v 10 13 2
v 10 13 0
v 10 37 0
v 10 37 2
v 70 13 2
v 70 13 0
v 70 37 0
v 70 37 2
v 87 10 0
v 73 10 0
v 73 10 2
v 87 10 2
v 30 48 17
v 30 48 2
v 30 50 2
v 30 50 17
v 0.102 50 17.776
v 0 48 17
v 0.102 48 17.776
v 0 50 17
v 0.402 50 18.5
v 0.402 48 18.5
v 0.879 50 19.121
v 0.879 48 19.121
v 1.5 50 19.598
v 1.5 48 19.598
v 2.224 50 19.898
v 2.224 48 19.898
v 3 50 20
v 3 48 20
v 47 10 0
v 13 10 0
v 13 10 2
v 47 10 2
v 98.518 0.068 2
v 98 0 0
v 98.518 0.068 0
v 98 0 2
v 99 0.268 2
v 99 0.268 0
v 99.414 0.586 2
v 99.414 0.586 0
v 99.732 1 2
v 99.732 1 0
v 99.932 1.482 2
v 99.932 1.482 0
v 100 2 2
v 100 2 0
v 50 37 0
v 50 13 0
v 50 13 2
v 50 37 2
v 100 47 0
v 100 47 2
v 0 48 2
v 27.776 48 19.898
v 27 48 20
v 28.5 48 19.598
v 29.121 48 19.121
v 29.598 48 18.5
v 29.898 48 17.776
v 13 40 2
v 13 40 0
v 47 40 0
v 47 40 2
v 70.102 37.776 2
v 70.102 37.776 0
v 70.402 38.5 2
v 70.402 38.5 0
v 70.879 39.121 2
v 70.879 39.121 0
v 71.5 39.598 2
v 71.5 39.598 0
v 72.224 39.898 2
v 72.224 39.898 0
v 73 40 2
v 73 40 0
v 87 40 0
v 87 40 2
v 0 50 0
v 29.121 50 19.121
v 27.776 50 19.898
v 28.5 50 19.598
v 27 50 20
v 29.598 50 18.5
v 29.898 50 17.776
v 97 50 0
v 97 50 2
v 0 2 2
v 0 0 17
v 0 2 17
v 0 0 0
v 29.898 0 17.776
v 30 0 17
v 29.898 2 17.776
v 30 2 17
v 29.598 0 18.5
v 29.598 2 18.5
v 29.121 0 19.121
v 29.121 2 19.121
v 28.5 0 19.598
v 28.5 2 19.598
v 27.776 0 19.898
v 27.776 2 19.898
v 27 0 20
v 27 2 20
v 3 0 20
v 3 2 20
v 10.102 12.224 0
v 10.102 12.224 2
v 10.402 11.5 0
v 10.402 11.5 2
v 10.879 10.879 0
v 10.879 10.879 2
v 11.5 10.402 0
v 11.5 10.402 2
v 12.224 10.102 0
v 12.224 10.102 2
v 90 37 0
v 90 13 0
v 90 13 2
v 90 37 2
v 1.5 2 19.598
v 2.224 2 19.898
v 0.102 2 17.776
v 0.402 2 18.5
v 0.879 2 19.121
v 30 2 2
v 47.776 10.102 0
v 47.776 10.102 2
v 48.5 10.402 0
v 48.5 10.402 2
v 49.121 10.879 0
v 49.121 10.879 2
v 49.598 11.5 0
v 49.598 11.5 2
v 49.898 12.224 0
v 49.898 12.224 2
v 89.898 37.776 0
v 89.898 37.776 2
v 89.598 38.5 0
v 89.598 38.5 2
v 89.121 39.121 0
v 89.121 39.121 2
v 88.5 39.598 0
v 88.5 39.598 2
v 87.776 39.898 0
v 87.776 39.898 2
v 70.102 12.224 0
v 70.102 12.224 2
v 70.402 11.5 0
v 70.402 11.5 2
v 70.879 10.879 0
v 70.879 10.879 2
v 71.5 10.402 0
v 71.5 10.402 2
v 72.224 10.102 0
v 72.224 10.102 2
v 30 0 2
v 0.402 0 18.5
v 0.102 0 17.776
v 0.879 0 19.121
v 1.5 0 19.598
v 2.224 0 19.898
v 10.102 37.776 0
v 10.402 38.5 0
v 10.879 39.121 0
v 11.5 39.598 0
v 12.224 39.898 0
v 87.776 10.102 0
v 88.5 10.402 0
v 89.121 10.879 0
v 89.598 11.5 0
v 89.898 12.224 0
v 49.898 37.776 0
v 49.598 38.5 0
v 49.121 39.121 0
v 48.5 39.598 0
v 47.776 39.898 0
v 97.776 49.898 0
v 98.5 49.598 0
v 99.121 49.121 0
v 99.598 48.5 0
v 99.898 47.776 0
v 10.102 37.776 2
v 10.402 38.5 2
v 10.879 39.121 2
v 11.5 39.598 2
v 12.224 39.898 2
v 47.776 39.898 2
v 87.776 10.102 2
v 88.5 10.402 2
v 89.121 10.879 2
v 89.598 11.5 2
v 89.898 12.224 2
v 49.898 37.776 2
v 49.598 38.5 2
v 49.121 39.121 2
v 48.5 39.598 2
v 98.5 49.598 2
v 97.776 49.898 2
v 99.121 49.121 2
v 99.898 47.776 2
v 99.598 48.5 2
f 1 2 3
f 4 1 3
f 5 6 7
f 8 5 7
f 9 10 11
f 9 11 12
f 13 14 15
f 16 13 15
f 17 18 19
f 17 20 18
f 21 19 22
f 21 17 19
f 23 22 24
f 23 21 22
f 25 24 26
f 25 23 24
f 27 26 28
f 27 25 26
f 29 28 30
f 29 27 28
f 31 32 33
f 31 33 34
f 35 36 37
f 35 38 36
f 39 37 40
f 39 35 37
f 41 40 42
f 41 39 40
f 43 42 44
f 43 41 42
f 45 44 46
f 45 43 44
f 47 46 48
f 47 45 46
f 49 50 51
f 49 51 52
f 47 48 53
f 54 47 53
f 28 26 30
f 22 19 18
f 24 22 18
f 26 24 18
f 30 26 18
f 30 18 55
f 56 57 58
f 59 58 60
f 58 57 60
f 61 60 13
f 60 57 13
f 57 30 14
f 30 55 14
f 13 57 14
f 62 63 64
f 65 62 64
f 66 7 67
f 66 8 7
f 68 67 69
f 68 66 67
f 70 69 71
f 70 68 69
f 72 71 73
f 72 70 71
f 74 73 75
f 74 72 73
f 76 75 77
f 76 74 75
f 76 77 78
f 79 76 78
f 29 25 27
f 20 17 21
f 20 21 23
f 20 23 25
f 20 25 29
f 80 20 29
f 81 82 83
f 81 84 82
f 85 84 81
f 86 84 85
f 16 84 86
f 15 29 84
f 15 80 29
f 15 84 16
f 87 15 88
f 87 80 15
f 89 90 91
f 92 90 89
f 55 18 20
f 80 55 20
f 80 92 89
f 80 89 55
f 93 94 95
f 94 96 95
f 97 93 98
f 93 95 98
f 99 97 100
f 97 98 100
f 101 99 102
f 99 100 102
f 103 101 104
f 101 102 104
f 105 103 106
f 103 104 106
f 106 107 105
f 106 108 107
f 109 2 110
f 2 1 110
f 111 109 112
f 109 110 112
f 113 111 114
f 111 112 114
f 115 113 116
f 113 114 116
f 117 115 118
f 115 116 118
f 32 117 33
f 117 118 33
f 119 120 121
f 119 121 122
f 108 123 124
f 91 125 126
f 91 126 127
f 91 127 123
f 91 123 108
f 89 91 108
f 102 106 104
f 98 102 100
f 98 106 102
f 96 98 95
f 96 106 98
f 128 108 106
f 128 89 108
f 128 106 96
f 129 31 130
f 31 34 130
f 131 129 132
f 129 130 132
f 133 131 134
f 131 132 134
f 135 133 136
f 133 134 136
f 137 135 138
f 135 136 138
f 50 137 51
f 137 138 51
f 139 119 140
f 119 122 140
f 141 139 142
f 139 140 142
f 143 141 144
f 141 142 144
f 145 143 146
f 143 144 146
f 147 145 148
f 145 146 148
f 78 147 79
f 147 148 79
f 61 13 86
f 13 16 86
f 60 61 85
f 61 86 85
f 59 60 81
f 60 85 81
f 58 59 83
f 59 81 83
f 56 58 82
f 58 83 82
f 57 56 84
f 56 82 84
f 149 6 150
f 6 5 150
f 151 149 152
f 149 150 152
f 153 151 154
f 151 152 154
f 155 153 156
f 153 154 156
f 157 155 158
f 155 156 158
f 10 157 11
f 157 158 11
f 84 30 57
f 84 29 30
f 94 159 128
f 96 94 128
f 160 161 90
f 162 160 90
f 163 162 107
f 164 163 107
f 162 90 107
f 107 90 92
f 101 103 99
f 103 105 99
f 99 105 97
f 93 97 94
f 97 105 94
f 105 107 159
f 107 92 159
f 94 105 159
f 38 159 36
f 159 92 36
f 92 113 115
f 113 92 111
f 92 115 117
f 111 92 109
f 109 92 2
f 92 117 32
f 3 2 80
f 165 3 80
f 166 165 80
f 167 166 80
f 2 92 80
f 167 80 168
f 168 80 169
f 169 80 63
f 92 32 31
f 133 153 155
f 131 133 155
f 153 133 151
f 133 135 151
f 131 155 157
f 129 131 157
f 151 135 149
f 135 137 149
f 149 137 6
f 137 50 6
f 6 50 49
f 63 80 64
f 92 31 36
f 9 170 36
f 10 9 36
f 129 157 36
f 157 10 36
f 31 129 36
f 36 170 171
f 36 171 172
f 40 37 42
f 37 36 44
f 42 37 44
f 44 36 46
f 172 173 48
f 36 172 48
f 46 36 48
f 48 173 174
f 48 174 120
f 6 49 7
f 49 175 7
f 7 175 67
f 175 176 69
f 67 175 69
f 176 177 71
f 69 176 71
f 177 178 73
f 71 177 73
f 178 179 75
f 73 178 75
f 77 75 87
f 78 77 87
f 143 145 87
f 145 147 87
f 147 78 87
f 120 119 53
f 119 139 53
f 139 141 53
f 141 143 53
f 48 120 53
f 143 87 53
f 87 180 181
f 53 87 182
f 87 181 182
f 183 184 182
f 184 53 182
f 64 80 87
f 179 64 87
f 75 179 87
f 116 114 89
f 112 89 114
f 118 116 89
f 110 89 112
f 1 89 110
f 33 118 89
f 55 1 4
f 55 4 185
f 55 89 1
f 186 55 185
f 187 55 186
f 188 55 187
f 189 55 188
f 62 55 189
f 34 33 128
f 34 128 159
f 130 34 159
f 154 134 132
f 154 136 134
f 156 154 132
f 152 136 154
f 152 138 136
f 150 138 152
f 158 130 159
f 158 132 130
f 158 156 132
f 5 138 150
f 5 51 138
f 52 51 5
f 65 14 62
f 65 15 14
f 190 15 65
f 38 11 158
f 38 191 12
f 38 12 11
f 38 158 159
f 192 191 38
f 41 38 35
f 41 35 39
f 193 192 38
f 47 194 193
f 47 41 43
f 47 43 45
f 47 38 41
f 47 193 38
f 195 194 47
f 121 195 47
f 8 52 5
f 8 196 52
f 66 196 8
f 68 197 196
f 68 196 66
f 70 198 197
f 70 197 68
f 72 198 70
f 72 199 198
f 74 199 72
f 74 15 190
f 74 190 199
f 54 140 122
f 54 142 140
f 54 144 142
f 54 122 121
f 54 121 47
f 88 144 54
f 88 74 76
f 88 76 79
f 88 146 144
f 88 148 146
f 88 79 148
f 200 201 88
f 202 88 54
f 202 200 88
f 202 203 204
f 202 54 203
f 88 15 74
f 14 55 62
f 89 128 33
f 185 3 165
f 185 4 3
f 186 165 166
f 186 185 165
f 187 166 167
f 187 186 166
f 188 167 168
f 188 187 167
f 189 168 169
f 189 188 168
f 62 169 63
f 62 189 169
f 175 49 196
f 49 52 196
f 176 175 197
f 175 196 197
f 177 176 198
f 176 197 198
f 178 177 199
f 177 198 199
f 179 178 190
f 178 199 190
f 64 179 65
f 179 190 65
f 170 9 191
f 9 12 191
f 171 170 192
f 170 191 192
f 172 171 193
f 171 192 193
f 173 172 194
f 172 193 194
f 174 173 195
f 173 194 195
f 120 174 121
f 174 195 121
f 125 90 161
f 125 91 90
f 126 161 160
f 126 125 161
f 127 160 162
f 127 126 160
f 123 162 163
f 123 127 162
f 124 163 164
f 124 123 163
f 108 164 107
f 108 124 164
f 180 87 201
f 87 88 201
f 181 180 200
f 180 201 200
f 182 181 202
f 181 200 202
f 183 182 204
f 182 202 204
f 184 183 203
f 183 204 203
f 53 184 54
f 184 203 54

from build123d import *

# Parameters (mm, degrees)
BOX002_W      = 20
BOX002_H      = 30
BOX002_DEPTH  = 2
FILLET003_R   = 3
BOX001_W      = 40
BOX001_H      = 30
BOX001_DEPTH  = 2
FILLET002_R   = 3
BOX_W         = 100
BOX_H         = 50
BOX_DEPTH     = 2
FILLET_R      = 2
FILLET001_R   = 3
BOX003_W      = 30
BOX003_H      = 2
BOX003_DEPTH  = 20
FILLET004_R   = 3
ARRAY_Y_COUNT = 2
ARRAY_Y_PITCH = 48


with BuildPart() as fillet003:
    # Box002 → Box002 (new body)
    with BuildSketch(Plane.XY):
        with Locations((10, 15)):
            Rectangle(BOX002_W, BOX002_H)
    extrude(amount=BOX002_DEPTH)

    # Fillet003
    fillet003_edges = [fillet003.edges().sort_by_distance(p)[0] for p in [
        (0, 0, 1),
        (0, 30, 1),
        (20, 0, 1),
        (20, 30, 1),
    ]]
    fillet(fillet003_edges, radius=FILLET003_R)


with BuildPart() as fillet003_1:
    # Fillet003 placement: moved
    add(fillet003.part.moved(Location((70, 10, 0))))


with BuildPart() as fillet002:
    # Box001 → Box001 (new body)
    with BuildSketch(Plane(origin=(10, 10, 0), x_dir=(1, 0, 0), z_dir=(0, 0, 1))):
        with Locations((20, 15)):
            Rectangle(BOX001_W, BOX001_H)
    extrude(amount=BOX001_DEPTH)

    # Fillet002
    fillet002_edges = [fillet002.edges().sort_by_distance(p)[0] for p in [
        (10, 10, 1),
        (10, 40, 1),
        (50, 10, 1),
        (50, 40, 1),
    ]]
    fillet(fillet002_edges, radius=FILLET002_R)


with BuildPart() as cut001:
    # Box → Box (new body)
    with BuildSketch(Plane.XY):
        with Locations((50, 25)):
            Rectangle(BOX_W, BOX_H)
    extrude(amount=BOX_DEPTH)

    # Fillet
    fillet_edges = [cut001.edges().sort_by_distance(p)[0] for p in [
        (0, 0, 1),
        (0, 50, 1),
        (100, 0, 1),
    ]]
    fillet(fillet_edges, radius=FILLET_R)

    # Fillet001
    fillet001_edges = [cut001.edges().sort_by_distance(p)[0] for p in [
        (100, 50, 1),
    ]]
    fillet(fillet001_edges, radius=FILLET001_R)

    # Cut: cut Fillet002
    add(fillet002.part, mode=Mode.SUBTRACT)

    # Cut001: cut Fillet003
    add(fillet003_1.part, mode=Mode.SUBTRACT)


with BuildPart() as fusion:
    # Box003 → Box003 (new body)
    with BuildSketch(Plane.XY):
        with Locations((15, 1)):
            Rectangle(BOX003_W, BOX003_H)
    extrude(amount=BOX003_DEPTH)

    # Fillet004
    fillet004_edges = [fusion.edges().sort_by_distance(p)[0] for p in [
        (0, 1, 20),
        (30, 1, 20),
    ]]
    fillet(fillet004_edges, radius=FILLET004_R)

    # Array Y: Fusion ×2


with BuildPart() as fusion_1:
    add(fusion.part)
    with Locations(*[(0, i * ARRAY_Y_PITCH, 0) for i in range(1, ARRAY_Y_COUNT)]):
        add(fusion.part)

    # Fusion: union Cut001
    add(cut001.part)


solid = fusion_1.part
